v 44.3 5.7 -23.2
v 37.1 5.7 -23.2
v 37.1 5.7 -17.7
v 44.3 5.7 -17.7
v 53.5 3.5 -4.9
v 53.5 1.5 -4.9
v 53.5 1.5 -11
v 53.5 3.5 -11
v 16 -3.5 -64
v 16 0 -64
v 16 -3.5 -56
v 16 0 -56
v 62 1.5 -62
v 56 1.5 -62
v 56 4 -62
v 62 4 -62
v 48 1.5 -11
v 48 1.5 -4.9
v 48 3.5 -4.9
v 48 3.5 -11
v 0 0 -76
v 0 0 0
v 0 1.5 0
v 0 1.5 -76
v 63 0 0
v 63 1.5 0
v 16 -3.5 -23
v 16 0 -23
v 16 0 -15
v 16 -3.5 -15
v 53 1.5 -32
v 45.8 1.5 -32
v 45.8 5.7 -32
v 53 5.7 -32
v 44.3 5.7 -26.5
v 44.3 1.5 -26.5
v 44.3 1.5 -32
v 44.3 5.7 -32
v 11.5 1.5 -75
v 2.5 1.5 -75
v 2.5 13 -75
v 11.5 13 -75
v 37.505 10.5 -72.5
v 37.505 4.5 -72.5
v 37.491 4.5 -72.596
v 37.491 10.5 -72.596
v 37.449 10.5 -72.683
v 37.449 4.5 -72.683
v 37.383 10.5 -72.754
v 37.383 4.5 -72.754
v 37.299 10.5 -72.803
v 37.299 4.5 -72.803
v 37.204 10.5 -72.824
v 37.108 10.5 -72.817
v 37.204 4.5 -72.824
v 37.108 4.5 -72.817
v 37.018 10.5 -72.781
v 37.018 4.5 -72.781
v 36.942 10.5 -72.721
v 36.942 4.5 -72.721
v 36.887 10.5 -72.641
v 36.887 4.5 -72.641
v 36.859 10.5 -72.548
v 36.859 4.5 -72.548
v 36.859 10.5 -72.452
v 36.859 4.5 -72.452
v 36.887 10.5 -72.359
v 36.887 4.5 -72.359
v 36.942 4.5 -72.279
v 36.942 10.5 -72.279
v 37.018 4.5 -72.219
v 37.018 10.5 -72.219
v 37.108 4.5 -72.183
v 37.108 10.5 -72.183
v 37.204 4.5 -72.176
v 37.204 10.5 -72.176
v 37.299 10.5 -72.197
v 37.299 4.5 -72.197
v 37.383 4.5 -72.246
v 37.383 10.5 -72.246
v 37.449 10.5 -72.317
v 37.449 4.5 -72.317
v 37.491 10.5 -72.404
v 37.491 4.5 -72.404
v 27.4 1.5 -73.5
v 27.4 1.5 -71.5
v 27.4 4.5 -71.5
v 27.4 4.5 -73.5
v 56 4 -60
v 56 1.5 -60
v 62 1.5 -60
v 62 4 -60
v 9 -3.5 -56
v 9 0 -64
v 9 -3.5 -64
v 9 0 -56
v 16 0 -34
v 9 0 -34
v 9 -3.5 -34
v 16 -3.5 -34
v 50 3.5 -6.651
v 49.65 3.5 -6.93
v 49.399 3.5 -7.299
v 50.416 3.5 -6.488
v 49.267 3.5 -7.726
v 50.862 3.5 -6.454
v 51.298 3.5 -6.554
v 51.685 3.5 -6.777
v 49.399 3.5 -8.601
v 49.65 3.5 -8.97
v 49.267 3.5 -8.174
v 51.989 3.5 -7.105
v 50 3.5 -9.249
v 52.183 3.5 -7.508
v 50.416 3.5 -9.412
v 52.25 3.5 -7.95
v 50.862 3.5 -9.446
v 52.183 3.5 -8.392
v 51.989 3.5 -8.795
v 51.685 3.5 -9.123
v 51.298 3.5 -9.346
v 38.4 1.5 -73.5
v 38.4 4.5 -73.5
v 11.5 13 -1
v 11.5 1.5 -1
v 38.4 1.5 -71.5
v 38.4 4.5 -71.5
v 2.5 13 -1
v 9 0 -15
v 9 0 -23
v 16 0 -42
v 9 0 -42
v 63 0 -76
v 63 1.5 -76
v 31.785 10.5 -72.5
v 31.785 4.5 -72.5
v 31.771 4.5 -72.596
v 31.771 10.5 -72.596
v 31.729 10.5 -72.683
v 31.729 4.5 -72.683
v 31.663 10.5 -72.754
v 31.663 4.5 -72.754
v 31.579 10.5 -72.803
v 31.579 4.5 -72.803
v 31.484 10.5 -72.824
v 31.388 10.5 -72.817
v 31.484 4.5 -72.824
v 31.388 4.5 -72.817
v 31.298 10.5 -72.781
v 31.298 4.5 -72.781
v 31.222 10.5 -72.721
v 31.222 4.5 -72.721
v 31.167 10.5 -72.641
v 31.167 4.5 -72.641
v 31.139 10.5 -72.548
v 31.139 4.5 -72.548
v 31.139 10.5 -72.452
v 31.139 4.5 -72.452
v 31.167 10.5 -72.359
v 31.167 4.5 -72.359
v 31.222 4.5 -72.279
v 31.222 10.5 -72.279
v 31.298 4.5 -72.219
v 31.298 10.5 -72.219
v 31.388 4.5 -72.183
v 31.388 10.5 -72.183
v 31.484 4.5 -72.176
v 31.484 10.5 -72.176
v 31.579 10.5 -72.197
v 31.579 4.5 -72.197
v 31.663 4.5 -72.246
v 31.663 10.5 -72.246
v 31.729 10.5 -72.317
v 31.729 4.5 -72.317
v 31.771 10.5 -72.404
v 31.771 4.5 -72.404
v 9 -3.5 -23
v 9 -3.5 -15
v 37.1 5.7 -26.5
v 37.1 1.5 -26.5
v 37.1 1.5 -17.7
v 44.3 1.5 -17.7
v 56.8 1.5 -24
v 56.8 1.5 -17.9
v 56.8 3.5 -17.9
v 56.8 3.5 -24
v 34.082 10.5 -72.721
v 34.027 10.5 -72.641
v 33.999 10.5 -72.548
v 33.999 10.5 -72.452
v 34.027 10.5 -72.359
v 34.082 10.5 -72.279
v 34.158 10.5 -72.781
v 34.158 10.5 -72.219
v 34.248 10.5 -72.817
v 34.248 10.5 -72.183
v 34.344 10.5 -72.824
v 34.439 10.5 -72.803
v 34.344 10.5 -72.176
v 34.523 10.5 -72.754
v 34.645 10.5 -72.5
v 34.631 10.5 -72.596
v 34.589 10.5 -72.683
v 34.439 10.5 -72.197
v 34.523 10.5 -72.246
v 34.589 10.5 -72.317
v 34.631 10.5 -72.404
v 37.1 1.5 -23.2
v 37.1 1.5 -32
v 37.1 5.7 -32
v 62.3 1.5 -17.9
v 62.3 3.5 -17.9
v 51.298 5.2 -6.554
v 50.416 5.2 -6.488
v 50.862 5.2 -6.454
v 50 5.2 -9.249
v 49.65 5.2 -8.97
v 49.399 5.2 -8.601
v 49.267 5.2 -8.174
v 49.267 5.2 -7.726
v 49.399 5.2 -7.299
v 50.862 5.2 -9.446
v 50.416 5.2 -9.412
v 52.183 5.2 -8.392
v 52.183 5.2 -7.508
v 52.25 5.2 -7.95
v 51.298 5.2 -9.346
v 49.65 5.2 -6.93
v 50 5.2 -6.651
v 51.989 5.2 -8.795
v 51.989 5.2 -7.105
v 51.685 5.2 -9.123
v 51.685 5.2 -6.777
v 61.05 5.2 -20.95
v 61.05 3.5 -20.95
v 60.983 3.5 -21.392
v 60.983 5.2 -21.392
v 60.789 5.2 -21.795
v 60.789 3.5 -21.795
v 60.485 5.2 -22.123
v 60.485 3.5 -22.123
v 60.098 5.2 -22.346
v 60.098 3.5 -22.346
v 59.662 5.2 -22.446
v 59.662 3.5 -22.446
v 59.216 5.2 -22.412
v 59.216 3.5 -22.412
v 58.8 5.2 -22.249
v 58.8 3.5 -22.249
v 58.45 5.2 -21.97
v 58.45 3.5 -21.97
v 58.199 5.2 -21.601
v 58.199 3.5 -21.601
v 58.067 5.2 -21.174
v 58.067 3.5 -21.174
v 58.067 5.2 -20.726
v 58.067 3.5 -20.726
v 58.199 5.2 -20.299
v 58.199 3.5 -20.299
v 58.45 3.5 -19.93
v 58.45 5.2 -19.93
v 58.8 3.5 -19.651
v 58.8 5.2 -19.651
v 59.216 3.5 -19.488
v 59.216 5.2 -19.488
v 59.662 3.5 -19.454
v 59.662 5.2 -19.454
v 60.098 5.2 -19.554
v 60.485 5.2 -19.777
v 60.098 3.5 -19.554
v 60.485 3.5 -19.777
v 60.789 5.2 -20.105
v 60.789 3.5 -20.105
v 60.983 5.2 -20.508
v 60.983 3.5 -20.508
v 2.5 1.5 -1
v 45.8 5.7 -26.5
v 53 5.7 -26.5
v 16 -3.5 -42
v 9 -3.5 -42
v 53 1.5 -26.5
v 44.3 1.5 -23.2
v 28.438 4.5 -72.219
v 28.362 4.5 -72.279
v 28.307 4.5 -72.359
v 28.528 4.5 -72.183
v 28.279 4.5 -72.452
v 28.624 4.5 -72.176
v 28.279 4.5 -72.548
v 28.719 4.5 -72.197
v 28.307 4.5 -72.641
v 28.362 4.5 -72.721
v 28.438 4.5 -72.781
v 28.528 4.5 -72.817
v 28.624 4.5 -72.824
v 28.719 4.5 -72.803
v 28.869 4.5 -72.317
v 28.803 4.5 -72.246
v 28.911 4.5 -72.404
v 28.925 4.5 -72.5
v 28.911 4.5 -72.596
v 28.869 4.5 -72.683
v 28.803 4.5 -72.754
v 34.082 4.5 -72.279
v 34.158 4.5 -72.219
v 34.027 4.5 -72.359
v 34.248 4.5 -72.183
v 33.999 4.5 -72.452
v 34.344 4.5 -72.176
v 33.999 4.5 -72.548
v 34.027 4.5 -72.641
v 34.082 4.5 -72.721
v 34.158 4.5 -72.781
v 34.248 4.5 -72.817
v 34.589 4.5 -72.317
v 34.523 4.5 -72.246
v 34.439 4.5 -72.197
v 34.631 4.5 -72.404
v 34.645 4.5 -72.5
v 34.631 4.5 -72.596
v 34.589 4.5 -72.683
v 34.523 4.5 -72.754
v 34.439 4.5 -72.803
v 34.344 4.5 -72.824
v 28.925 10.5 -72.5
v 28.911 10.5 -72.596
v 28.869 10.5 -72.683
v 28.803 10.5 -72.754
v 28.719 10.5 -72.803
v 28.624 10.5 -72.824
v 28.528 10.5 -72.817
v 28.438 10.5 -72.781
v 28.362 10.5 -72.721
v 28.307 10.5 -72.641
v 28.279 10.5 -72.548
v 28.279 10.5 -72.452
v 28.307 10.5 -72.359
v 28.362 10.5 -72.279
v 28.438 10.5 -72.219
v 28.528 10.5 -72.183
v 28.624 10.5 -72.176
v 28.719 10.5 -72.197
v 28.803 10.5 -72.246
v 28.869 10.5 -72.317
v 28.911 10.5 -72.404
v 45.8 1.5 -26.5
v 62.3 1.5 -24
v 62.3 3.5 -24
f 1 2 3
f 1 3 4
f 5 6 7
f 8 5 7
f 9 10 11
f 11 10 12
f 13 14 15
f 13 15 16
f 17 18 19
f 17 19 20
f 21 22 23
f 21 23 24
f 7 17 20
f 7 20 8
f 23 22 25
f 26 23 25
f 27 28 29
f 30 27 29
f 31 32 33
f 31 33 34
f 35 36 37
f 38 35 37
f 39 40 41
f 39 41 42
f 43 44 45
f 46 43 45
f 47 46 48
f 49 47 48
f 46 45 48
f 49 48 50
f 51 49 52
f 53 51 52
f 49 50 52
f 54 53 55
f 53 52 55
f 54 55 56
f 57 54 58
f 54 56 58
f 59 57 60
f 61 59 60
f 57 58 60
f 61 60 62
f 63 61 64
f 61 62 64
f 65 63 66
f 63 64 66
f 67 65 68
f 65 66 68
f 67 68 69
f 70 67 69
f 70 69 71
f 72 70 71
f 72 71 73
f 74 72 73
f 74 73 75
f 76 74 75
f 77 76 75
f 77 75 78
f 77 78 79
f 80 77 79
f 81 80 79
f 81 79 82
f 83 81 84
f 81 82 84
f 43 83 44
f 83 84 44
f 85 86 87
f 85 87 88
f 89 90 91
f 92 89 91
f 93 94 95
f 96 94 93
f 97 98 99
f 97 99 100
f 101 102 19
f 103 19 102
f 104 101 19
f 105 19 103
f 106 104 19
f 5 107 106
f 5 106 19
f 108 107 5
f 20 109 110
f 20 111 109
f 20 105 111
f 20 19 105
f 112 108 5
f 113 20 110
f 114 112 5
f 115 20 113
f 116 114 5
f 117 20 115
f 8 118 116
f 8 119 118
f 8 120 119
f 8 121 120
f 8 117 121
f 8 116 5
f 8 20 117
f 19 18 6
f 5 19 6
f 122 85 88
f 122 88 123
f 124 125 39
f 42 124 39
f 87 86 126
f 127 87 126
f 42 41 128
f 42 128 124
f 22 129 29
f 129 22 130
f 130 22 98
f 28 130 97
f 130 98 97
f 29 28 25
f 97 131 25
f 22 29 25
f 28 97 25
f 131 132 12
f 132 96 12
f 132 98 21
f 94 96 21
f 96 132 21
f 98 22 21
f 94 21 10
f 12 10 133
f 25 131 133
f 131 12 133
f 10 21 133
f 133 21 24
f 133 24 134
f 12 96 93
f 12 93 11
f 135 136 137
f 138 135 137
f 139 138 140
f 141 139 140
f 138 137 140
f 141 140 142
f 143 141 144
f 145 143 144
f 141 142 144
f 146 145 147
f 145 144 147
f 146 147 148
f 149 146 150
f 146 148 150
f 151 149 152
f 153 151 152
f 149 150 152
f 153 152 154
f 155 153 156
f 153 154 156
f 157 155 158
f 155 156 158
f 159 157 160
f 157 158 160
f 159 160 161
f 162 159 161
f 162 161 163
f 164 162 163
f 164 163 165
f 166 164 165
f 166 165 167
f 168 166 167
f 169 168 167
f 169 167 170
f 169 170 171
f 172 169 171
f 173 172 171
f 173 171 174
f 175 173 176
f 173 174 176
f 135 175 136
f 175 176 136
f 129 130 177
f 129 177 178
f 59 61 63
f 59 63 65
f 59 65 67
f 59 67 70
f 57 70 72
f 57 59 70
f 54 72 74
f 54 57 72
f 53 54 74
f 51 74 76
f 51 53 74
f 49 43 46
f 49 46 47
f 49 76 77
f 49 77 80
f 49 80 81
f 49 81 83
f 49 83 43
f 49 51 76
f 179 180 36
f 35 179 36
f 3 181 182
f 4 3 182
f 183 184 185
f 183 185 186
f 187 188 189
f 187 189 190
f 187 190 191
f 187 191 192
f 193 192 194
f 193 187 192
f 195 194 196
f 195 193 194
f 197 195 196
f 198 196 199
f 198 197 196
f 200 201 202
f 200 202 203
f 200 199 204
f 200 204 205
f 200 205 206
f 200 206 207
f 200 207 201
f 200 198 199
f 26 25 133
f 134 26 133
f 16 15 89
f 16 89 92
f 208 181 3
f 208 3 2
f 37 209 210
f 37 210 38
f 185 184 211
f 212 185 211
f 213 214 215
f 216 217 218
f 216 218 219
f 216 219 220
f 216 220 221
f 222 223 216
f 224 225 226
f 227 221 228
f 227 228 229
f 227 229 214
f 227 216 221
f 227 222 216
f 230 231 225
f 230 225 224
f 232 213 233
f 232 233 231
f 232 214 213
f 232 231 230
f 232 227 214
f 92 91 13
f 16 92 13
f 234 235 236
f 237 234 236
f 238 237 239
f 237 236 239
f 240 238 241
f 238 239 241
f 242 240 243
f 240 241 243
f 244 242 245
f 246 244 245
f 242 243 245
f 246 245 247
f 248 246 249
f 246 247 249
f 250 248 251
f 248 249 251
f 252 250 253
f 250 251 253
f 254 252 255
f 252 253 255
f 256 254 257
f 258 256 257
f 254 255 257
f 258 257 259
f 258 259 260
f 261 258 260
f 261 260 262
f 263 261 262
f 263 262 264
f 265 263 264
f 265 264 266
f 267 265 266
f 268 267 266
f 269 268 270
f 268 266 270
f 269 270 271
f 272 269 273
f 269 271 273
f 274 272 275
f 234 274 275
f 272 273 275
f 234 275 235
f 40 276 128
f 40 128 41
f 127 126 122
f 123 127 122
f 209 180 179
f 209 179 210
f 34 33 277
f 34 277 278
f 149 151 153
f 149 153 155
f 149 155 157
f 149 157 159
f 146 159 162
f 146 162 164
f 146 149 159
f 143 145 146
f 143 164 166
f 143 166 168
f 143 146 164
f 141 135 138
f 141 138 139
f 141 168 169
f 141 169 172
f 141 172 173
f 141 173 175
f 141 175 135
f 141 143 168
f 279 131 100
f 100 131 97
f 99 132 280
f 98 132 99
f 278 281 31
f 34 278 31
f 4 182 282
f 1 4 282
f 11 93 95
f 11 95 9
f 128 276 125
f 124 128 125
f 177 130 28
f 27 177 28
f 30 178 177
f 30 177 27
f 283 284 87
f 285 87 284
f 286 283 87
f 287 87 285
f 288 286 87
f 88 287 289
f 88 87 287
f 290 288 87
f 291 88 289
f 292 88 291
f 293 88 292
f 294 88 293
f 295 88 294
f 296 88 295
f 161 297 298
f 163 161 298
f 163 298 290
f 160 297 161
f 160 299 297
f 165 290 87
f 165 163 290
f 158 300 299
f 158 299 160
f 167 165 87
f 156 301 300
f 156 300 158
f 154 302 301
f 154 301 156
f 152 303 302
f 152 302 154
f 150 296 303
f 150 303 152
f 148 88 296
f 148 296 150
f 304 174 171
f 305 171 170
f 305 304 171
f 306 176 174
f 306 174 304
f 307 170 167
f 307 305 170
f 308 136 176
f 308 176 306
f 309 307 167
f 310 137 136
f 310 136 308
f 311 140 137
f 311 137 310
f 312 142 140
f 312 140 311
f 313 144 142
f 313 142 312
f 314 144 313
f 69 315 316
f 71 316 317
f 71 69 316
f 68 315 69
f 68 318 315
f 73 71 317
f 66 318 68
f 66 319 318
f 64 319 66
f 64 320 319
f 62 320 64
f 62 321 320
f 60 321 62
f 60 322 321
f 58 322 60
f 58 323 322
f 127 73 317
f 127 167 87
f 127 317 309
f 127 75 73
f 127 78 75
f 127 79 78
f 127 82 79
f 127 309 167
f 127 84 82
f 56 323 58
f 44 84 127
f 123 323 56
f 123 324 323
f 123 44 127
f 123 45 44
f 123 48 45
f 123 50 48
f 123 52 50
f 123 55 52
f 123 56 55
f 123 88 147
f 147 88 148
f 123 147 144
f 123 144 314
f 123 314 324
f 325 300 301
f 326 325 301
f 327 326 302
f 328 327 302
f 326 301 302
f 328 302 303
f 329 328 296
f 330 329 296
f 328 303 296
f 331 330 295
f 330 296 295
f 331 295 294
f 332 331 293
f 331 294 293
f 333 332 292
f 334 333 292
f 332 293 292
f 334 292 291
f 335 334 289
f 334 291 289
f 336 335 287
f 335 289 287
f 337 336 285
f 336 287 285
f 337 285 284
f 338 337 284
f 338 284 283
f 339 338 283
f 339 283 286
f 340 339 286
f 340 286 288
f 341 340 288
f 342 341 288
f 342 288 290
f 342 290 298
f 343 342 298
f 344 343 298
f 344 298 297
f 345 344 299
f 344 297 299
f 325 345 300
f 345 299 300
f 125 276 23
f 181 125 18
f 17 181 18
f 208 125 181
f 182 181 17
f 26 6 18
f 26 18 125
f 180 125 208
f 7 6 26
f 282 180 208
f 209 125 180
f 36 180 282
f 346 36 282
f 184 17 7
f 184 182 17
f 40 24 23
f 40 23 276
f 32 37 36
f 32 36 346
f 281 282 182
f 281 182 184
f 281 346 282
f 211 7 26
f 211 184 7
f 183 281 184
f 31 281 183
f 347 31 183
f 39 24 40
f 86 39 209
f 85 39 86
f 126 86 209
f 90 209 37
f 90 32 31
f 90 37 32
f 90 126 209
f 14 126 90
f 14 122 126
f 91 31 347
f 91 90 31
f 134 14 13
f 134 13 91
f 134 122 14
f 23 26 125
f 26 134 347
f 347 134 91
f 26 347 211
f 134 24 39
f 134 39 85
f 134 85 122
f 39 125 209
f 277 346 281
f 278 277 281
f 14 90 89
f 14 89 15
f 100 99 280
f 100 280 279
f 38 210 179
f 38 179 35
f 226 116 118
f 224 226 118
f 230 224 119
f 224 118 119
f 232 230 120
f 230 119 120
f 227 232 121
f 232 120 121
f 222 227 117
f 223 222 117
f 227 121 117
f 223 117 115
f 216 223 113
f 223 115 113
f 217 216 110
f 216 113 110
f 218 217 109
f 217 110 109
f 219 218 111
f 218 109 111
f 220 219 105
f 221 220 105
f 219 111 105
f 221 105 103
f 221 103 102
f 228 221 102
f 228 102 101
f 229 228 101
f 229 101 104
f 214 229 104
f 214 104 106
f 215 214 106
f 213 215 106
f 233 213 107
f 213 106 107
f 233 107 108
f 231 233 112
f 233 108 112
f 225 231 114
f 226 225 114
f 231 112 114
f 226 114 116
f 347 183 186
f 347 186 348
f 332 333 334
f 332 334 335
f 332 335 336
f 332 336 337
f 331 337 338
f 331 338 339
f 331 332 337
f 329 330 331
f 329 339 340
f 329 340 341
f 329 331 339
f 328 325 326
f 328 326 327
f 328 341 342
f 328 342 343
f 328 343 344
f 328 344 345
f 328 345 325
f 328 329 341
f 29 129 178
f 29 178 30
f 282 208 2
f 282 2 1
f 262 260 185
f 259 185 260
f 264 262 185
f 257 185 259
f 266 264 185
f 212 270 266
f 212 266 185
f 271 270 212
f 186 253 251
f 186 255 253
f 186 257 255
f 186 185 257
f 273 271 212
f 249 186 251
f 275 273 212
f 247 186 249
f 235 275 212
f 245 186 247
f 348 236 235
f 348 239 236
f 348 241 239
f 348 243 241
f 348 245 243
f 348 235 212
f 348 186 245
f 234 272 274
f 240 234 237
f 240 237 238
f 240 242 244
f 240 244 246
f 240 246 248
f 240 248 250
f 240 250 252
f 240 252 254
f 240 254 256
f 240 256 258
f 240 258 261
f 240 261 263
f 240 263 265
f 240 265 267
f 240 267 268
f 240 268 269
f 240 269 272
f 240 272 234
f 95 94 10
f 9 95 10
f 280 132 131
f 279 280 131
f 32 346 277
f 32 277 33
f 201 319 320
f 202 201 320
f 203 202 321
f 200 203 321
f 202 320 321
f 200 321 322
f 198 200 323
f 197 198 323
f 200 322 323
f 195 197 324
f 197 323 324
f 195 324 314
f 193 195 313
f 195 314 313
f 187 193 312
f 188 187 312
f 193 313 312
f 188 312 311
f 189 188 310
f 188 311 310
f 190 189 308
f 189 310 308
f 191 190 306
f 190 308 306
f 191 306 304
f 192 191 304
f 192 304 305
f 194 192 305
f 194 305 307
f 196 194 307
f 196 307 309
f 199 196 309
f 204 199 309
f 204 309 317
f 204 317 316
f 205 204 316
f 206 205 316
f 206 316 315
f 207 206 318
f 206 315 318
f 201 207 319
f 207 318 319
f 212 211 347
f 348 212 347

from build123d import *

# Parameters (mm, degrees)
SKETCH1_W            = 63
SKETCH1_H            = 76
BOSS_EXTRUDE1_DEPTH  = 1.5
SKETCH2_W            = 9
SKETCH2_H            = 74
BOSS_EXTRUDE2_DEPTH  = 11.5
SKETCH3_W            = 7
SKETCH3_H            = 8
BOSS_EXTRUDE3_DEPTH  = 3.5
SKETCH4_W            = 11
SKETCH4_H            = 2
BOSS_EXTRUDE4_DEPTH  = 3
SKETCH5_R            = 0.325
BOSS_EXTRUDE5_DEPTH  = 6
SKETCH6_W            = 6
SKETCH6_H            = 2
BOSS_EXTRUDE6_DEPTH  = 2.5
SKETCH8_W            = 7.2
SKETCH8_H            = 5.5
BOSS_EXTRUDE8_DEPTH  = 4.2
SKETCH9_W            = 5.5
SKETCH9_H            = 6.1
BOSS_EXTRUDE9_DEPTH  = 2
SKETCH10_R           = 1.5
BOSS_EXTRUDE10_DEPTH = 1.7
SKETCH11_W           = 5.5
SKETCH11_H           = 6.1
BOSS_EXTRUDE11_DEPTH = 2
SKETCH12_R           = 1.5
BOSS_EXTRUDE12_DEPTH = 1.7


with BuildPart() as part:
    # Sketch1 → Boss-Extrude1 (new body)
    with BuildSketch(Plane(origin=(0, 0, 0), x_dir=(1, 0, 0), z_dir=(0, 1, 0))):
        with Locations((31.5, 38)):
            Rectangle(SKETCH1_W, SKETCH1_H)
    extrude(amount=BOSS_EXTRUDE1_DEPTH)

    # Sketch2 → Boss-Extrude2 (add)
    with BuildSketch(Plane(origin=(0, 1.5, 0), x_dir=(1, 0, 0), z_dir=(0, 1, 0))):
        with Locations((7, 38)):
            Rectangle(SKETCH2_W, SKETCH2_H)
    extrude(amount=BOSS_EXTRUDE2_DEPTH)

    # Sketch3 → Boss-Extrude3 (add)
    with BuildSketch(Plane.XZ):
        with Locations((12.5, -19)):
            Rectangle(SKETCH3_W, SKETCH3_H)
        with Locations((12.5, -38)):
            Rectangle(SKETCH3_W, SKETCH3_H)
        with Locations((12.5, -60)):
            Rectangle(SKETCH3_W, SKETCH3_H)
    extrude(amount=BOSS_EXTRUDE3_DEPTH)

    # Sketch4 → Boss-Extrude4 (add)
    with BuildSketch(Plane(origin=(0, 1.5, 0), x_dir=(1, 0, 0), z_dir=(0, 1, 0))):
        with Locations((32.9, 72.5)):
            Rectangle(SKETCH4_W, SKETCH4_H)
    extrude(amount=BOSS_EXTRUDE4_DEPTH)

    # Sketch5 → Boss-Extrude5 (add)
    with BuildSketch(Plane(origin=(0, 4.5, 0), x_dir=(1, 0, 0), z_dir=(0, 1, 0))):
        with Locations((28.6, 72.5)):
            Circle(SKETCH5_R)
        with Locations((31.46, 72.5)):
            Circle(SKETCH5_R)
        with Locations((34.32, 72.5)):
            Circle(SKETCH5_R)
        with Locations((37.18, 72.5)):
            Circle(SKETCH5_R)
    extrude(amount=BOSS_EXTRUDE5_DEPTH)

    # Sketch6 → Boss-Extrude6 (add)
    with BuildSketch(Plane(origin=(0, 1.5, 0), x_dir=(1, 0, 0), z_dir=(0, 1, 0))):
        with Locations((59, 61)):
            Rectangle(SKETCH6_W, SKETCH6_H)
    extrude(amount=BOSS_EXTRUDE6_DEPTH)

    # Sketch8 → Boss-Extrude8 (add)
    with BuildSketch(Plane(origin=(0, 1.5, 0), x_dir=(1, 0, 0), z_dir=(0, 1, 0))):
        with Locations((40.7, 29.25)):
            Rectangle(SKETCH8_W, SKETCH8_H)
        with Locations((49.4, 29.25)):
            Rectangle(SKETCH8_W, SKETCH8_H)
        with Locations((40.7, 20.45)):
            Rectangle(SKETCH8_W, SKETCH8_H)
    extrude(amount=BOSS_EXTRUDE8_DEPTH)

    # Sketch9 → Boss-Extrude9 (add)
    with BuildSketch(Plane(origin=(0, 1.5, 0), x_dir=(1, 0, 0), z_dir=(0, 1, 0))):
        with Locations((59.55, 20.95)):
            Rectangle(SKETCH9_W, SKETCH9_H)
    extrude(amount=BOSS_EXTRUDE9_DEPTH)

    # Sketch10 → Boss-Extrude10 (add)
    with BuildSketch(Plane(origin=(0, 3.5, 0), x_dir=(1, 0, 0), z_dir=(0, 1, 0))):
        with Locations((59.55, 20.95)):
            Circle(SKETCH10_R)
    extrude(amount=BOSS_EXTRUDE10_DEPTH)

    # Sketch11 → Boss-Extrude11 (add)
    with BuildSketch(Plane(origin=(0, 1.5, 0), x_dir=(1, 0, 0), z_dir=(0, 1, 0))):
        with Locations((50.75, 7.95)):
            Rectangle(SKETCH11_W, SKETCH11_H)
    extrude(amount=BOSS_EXTRUDE11_DEPTH)

    # Sketch12 → Boss-Extrude12 (add)
    with BuildSketch(Plane(origin=(0, 3.5, 0), x_dir=(1, 0, 0), z_dir=(0, 1, 0))):
        with Locations((50.75, 7.95)):
            Circle(SKETCH12_R)
    extrude(amount=BOSS_EXTRUDE12_DEPTH)


solid = part.part
